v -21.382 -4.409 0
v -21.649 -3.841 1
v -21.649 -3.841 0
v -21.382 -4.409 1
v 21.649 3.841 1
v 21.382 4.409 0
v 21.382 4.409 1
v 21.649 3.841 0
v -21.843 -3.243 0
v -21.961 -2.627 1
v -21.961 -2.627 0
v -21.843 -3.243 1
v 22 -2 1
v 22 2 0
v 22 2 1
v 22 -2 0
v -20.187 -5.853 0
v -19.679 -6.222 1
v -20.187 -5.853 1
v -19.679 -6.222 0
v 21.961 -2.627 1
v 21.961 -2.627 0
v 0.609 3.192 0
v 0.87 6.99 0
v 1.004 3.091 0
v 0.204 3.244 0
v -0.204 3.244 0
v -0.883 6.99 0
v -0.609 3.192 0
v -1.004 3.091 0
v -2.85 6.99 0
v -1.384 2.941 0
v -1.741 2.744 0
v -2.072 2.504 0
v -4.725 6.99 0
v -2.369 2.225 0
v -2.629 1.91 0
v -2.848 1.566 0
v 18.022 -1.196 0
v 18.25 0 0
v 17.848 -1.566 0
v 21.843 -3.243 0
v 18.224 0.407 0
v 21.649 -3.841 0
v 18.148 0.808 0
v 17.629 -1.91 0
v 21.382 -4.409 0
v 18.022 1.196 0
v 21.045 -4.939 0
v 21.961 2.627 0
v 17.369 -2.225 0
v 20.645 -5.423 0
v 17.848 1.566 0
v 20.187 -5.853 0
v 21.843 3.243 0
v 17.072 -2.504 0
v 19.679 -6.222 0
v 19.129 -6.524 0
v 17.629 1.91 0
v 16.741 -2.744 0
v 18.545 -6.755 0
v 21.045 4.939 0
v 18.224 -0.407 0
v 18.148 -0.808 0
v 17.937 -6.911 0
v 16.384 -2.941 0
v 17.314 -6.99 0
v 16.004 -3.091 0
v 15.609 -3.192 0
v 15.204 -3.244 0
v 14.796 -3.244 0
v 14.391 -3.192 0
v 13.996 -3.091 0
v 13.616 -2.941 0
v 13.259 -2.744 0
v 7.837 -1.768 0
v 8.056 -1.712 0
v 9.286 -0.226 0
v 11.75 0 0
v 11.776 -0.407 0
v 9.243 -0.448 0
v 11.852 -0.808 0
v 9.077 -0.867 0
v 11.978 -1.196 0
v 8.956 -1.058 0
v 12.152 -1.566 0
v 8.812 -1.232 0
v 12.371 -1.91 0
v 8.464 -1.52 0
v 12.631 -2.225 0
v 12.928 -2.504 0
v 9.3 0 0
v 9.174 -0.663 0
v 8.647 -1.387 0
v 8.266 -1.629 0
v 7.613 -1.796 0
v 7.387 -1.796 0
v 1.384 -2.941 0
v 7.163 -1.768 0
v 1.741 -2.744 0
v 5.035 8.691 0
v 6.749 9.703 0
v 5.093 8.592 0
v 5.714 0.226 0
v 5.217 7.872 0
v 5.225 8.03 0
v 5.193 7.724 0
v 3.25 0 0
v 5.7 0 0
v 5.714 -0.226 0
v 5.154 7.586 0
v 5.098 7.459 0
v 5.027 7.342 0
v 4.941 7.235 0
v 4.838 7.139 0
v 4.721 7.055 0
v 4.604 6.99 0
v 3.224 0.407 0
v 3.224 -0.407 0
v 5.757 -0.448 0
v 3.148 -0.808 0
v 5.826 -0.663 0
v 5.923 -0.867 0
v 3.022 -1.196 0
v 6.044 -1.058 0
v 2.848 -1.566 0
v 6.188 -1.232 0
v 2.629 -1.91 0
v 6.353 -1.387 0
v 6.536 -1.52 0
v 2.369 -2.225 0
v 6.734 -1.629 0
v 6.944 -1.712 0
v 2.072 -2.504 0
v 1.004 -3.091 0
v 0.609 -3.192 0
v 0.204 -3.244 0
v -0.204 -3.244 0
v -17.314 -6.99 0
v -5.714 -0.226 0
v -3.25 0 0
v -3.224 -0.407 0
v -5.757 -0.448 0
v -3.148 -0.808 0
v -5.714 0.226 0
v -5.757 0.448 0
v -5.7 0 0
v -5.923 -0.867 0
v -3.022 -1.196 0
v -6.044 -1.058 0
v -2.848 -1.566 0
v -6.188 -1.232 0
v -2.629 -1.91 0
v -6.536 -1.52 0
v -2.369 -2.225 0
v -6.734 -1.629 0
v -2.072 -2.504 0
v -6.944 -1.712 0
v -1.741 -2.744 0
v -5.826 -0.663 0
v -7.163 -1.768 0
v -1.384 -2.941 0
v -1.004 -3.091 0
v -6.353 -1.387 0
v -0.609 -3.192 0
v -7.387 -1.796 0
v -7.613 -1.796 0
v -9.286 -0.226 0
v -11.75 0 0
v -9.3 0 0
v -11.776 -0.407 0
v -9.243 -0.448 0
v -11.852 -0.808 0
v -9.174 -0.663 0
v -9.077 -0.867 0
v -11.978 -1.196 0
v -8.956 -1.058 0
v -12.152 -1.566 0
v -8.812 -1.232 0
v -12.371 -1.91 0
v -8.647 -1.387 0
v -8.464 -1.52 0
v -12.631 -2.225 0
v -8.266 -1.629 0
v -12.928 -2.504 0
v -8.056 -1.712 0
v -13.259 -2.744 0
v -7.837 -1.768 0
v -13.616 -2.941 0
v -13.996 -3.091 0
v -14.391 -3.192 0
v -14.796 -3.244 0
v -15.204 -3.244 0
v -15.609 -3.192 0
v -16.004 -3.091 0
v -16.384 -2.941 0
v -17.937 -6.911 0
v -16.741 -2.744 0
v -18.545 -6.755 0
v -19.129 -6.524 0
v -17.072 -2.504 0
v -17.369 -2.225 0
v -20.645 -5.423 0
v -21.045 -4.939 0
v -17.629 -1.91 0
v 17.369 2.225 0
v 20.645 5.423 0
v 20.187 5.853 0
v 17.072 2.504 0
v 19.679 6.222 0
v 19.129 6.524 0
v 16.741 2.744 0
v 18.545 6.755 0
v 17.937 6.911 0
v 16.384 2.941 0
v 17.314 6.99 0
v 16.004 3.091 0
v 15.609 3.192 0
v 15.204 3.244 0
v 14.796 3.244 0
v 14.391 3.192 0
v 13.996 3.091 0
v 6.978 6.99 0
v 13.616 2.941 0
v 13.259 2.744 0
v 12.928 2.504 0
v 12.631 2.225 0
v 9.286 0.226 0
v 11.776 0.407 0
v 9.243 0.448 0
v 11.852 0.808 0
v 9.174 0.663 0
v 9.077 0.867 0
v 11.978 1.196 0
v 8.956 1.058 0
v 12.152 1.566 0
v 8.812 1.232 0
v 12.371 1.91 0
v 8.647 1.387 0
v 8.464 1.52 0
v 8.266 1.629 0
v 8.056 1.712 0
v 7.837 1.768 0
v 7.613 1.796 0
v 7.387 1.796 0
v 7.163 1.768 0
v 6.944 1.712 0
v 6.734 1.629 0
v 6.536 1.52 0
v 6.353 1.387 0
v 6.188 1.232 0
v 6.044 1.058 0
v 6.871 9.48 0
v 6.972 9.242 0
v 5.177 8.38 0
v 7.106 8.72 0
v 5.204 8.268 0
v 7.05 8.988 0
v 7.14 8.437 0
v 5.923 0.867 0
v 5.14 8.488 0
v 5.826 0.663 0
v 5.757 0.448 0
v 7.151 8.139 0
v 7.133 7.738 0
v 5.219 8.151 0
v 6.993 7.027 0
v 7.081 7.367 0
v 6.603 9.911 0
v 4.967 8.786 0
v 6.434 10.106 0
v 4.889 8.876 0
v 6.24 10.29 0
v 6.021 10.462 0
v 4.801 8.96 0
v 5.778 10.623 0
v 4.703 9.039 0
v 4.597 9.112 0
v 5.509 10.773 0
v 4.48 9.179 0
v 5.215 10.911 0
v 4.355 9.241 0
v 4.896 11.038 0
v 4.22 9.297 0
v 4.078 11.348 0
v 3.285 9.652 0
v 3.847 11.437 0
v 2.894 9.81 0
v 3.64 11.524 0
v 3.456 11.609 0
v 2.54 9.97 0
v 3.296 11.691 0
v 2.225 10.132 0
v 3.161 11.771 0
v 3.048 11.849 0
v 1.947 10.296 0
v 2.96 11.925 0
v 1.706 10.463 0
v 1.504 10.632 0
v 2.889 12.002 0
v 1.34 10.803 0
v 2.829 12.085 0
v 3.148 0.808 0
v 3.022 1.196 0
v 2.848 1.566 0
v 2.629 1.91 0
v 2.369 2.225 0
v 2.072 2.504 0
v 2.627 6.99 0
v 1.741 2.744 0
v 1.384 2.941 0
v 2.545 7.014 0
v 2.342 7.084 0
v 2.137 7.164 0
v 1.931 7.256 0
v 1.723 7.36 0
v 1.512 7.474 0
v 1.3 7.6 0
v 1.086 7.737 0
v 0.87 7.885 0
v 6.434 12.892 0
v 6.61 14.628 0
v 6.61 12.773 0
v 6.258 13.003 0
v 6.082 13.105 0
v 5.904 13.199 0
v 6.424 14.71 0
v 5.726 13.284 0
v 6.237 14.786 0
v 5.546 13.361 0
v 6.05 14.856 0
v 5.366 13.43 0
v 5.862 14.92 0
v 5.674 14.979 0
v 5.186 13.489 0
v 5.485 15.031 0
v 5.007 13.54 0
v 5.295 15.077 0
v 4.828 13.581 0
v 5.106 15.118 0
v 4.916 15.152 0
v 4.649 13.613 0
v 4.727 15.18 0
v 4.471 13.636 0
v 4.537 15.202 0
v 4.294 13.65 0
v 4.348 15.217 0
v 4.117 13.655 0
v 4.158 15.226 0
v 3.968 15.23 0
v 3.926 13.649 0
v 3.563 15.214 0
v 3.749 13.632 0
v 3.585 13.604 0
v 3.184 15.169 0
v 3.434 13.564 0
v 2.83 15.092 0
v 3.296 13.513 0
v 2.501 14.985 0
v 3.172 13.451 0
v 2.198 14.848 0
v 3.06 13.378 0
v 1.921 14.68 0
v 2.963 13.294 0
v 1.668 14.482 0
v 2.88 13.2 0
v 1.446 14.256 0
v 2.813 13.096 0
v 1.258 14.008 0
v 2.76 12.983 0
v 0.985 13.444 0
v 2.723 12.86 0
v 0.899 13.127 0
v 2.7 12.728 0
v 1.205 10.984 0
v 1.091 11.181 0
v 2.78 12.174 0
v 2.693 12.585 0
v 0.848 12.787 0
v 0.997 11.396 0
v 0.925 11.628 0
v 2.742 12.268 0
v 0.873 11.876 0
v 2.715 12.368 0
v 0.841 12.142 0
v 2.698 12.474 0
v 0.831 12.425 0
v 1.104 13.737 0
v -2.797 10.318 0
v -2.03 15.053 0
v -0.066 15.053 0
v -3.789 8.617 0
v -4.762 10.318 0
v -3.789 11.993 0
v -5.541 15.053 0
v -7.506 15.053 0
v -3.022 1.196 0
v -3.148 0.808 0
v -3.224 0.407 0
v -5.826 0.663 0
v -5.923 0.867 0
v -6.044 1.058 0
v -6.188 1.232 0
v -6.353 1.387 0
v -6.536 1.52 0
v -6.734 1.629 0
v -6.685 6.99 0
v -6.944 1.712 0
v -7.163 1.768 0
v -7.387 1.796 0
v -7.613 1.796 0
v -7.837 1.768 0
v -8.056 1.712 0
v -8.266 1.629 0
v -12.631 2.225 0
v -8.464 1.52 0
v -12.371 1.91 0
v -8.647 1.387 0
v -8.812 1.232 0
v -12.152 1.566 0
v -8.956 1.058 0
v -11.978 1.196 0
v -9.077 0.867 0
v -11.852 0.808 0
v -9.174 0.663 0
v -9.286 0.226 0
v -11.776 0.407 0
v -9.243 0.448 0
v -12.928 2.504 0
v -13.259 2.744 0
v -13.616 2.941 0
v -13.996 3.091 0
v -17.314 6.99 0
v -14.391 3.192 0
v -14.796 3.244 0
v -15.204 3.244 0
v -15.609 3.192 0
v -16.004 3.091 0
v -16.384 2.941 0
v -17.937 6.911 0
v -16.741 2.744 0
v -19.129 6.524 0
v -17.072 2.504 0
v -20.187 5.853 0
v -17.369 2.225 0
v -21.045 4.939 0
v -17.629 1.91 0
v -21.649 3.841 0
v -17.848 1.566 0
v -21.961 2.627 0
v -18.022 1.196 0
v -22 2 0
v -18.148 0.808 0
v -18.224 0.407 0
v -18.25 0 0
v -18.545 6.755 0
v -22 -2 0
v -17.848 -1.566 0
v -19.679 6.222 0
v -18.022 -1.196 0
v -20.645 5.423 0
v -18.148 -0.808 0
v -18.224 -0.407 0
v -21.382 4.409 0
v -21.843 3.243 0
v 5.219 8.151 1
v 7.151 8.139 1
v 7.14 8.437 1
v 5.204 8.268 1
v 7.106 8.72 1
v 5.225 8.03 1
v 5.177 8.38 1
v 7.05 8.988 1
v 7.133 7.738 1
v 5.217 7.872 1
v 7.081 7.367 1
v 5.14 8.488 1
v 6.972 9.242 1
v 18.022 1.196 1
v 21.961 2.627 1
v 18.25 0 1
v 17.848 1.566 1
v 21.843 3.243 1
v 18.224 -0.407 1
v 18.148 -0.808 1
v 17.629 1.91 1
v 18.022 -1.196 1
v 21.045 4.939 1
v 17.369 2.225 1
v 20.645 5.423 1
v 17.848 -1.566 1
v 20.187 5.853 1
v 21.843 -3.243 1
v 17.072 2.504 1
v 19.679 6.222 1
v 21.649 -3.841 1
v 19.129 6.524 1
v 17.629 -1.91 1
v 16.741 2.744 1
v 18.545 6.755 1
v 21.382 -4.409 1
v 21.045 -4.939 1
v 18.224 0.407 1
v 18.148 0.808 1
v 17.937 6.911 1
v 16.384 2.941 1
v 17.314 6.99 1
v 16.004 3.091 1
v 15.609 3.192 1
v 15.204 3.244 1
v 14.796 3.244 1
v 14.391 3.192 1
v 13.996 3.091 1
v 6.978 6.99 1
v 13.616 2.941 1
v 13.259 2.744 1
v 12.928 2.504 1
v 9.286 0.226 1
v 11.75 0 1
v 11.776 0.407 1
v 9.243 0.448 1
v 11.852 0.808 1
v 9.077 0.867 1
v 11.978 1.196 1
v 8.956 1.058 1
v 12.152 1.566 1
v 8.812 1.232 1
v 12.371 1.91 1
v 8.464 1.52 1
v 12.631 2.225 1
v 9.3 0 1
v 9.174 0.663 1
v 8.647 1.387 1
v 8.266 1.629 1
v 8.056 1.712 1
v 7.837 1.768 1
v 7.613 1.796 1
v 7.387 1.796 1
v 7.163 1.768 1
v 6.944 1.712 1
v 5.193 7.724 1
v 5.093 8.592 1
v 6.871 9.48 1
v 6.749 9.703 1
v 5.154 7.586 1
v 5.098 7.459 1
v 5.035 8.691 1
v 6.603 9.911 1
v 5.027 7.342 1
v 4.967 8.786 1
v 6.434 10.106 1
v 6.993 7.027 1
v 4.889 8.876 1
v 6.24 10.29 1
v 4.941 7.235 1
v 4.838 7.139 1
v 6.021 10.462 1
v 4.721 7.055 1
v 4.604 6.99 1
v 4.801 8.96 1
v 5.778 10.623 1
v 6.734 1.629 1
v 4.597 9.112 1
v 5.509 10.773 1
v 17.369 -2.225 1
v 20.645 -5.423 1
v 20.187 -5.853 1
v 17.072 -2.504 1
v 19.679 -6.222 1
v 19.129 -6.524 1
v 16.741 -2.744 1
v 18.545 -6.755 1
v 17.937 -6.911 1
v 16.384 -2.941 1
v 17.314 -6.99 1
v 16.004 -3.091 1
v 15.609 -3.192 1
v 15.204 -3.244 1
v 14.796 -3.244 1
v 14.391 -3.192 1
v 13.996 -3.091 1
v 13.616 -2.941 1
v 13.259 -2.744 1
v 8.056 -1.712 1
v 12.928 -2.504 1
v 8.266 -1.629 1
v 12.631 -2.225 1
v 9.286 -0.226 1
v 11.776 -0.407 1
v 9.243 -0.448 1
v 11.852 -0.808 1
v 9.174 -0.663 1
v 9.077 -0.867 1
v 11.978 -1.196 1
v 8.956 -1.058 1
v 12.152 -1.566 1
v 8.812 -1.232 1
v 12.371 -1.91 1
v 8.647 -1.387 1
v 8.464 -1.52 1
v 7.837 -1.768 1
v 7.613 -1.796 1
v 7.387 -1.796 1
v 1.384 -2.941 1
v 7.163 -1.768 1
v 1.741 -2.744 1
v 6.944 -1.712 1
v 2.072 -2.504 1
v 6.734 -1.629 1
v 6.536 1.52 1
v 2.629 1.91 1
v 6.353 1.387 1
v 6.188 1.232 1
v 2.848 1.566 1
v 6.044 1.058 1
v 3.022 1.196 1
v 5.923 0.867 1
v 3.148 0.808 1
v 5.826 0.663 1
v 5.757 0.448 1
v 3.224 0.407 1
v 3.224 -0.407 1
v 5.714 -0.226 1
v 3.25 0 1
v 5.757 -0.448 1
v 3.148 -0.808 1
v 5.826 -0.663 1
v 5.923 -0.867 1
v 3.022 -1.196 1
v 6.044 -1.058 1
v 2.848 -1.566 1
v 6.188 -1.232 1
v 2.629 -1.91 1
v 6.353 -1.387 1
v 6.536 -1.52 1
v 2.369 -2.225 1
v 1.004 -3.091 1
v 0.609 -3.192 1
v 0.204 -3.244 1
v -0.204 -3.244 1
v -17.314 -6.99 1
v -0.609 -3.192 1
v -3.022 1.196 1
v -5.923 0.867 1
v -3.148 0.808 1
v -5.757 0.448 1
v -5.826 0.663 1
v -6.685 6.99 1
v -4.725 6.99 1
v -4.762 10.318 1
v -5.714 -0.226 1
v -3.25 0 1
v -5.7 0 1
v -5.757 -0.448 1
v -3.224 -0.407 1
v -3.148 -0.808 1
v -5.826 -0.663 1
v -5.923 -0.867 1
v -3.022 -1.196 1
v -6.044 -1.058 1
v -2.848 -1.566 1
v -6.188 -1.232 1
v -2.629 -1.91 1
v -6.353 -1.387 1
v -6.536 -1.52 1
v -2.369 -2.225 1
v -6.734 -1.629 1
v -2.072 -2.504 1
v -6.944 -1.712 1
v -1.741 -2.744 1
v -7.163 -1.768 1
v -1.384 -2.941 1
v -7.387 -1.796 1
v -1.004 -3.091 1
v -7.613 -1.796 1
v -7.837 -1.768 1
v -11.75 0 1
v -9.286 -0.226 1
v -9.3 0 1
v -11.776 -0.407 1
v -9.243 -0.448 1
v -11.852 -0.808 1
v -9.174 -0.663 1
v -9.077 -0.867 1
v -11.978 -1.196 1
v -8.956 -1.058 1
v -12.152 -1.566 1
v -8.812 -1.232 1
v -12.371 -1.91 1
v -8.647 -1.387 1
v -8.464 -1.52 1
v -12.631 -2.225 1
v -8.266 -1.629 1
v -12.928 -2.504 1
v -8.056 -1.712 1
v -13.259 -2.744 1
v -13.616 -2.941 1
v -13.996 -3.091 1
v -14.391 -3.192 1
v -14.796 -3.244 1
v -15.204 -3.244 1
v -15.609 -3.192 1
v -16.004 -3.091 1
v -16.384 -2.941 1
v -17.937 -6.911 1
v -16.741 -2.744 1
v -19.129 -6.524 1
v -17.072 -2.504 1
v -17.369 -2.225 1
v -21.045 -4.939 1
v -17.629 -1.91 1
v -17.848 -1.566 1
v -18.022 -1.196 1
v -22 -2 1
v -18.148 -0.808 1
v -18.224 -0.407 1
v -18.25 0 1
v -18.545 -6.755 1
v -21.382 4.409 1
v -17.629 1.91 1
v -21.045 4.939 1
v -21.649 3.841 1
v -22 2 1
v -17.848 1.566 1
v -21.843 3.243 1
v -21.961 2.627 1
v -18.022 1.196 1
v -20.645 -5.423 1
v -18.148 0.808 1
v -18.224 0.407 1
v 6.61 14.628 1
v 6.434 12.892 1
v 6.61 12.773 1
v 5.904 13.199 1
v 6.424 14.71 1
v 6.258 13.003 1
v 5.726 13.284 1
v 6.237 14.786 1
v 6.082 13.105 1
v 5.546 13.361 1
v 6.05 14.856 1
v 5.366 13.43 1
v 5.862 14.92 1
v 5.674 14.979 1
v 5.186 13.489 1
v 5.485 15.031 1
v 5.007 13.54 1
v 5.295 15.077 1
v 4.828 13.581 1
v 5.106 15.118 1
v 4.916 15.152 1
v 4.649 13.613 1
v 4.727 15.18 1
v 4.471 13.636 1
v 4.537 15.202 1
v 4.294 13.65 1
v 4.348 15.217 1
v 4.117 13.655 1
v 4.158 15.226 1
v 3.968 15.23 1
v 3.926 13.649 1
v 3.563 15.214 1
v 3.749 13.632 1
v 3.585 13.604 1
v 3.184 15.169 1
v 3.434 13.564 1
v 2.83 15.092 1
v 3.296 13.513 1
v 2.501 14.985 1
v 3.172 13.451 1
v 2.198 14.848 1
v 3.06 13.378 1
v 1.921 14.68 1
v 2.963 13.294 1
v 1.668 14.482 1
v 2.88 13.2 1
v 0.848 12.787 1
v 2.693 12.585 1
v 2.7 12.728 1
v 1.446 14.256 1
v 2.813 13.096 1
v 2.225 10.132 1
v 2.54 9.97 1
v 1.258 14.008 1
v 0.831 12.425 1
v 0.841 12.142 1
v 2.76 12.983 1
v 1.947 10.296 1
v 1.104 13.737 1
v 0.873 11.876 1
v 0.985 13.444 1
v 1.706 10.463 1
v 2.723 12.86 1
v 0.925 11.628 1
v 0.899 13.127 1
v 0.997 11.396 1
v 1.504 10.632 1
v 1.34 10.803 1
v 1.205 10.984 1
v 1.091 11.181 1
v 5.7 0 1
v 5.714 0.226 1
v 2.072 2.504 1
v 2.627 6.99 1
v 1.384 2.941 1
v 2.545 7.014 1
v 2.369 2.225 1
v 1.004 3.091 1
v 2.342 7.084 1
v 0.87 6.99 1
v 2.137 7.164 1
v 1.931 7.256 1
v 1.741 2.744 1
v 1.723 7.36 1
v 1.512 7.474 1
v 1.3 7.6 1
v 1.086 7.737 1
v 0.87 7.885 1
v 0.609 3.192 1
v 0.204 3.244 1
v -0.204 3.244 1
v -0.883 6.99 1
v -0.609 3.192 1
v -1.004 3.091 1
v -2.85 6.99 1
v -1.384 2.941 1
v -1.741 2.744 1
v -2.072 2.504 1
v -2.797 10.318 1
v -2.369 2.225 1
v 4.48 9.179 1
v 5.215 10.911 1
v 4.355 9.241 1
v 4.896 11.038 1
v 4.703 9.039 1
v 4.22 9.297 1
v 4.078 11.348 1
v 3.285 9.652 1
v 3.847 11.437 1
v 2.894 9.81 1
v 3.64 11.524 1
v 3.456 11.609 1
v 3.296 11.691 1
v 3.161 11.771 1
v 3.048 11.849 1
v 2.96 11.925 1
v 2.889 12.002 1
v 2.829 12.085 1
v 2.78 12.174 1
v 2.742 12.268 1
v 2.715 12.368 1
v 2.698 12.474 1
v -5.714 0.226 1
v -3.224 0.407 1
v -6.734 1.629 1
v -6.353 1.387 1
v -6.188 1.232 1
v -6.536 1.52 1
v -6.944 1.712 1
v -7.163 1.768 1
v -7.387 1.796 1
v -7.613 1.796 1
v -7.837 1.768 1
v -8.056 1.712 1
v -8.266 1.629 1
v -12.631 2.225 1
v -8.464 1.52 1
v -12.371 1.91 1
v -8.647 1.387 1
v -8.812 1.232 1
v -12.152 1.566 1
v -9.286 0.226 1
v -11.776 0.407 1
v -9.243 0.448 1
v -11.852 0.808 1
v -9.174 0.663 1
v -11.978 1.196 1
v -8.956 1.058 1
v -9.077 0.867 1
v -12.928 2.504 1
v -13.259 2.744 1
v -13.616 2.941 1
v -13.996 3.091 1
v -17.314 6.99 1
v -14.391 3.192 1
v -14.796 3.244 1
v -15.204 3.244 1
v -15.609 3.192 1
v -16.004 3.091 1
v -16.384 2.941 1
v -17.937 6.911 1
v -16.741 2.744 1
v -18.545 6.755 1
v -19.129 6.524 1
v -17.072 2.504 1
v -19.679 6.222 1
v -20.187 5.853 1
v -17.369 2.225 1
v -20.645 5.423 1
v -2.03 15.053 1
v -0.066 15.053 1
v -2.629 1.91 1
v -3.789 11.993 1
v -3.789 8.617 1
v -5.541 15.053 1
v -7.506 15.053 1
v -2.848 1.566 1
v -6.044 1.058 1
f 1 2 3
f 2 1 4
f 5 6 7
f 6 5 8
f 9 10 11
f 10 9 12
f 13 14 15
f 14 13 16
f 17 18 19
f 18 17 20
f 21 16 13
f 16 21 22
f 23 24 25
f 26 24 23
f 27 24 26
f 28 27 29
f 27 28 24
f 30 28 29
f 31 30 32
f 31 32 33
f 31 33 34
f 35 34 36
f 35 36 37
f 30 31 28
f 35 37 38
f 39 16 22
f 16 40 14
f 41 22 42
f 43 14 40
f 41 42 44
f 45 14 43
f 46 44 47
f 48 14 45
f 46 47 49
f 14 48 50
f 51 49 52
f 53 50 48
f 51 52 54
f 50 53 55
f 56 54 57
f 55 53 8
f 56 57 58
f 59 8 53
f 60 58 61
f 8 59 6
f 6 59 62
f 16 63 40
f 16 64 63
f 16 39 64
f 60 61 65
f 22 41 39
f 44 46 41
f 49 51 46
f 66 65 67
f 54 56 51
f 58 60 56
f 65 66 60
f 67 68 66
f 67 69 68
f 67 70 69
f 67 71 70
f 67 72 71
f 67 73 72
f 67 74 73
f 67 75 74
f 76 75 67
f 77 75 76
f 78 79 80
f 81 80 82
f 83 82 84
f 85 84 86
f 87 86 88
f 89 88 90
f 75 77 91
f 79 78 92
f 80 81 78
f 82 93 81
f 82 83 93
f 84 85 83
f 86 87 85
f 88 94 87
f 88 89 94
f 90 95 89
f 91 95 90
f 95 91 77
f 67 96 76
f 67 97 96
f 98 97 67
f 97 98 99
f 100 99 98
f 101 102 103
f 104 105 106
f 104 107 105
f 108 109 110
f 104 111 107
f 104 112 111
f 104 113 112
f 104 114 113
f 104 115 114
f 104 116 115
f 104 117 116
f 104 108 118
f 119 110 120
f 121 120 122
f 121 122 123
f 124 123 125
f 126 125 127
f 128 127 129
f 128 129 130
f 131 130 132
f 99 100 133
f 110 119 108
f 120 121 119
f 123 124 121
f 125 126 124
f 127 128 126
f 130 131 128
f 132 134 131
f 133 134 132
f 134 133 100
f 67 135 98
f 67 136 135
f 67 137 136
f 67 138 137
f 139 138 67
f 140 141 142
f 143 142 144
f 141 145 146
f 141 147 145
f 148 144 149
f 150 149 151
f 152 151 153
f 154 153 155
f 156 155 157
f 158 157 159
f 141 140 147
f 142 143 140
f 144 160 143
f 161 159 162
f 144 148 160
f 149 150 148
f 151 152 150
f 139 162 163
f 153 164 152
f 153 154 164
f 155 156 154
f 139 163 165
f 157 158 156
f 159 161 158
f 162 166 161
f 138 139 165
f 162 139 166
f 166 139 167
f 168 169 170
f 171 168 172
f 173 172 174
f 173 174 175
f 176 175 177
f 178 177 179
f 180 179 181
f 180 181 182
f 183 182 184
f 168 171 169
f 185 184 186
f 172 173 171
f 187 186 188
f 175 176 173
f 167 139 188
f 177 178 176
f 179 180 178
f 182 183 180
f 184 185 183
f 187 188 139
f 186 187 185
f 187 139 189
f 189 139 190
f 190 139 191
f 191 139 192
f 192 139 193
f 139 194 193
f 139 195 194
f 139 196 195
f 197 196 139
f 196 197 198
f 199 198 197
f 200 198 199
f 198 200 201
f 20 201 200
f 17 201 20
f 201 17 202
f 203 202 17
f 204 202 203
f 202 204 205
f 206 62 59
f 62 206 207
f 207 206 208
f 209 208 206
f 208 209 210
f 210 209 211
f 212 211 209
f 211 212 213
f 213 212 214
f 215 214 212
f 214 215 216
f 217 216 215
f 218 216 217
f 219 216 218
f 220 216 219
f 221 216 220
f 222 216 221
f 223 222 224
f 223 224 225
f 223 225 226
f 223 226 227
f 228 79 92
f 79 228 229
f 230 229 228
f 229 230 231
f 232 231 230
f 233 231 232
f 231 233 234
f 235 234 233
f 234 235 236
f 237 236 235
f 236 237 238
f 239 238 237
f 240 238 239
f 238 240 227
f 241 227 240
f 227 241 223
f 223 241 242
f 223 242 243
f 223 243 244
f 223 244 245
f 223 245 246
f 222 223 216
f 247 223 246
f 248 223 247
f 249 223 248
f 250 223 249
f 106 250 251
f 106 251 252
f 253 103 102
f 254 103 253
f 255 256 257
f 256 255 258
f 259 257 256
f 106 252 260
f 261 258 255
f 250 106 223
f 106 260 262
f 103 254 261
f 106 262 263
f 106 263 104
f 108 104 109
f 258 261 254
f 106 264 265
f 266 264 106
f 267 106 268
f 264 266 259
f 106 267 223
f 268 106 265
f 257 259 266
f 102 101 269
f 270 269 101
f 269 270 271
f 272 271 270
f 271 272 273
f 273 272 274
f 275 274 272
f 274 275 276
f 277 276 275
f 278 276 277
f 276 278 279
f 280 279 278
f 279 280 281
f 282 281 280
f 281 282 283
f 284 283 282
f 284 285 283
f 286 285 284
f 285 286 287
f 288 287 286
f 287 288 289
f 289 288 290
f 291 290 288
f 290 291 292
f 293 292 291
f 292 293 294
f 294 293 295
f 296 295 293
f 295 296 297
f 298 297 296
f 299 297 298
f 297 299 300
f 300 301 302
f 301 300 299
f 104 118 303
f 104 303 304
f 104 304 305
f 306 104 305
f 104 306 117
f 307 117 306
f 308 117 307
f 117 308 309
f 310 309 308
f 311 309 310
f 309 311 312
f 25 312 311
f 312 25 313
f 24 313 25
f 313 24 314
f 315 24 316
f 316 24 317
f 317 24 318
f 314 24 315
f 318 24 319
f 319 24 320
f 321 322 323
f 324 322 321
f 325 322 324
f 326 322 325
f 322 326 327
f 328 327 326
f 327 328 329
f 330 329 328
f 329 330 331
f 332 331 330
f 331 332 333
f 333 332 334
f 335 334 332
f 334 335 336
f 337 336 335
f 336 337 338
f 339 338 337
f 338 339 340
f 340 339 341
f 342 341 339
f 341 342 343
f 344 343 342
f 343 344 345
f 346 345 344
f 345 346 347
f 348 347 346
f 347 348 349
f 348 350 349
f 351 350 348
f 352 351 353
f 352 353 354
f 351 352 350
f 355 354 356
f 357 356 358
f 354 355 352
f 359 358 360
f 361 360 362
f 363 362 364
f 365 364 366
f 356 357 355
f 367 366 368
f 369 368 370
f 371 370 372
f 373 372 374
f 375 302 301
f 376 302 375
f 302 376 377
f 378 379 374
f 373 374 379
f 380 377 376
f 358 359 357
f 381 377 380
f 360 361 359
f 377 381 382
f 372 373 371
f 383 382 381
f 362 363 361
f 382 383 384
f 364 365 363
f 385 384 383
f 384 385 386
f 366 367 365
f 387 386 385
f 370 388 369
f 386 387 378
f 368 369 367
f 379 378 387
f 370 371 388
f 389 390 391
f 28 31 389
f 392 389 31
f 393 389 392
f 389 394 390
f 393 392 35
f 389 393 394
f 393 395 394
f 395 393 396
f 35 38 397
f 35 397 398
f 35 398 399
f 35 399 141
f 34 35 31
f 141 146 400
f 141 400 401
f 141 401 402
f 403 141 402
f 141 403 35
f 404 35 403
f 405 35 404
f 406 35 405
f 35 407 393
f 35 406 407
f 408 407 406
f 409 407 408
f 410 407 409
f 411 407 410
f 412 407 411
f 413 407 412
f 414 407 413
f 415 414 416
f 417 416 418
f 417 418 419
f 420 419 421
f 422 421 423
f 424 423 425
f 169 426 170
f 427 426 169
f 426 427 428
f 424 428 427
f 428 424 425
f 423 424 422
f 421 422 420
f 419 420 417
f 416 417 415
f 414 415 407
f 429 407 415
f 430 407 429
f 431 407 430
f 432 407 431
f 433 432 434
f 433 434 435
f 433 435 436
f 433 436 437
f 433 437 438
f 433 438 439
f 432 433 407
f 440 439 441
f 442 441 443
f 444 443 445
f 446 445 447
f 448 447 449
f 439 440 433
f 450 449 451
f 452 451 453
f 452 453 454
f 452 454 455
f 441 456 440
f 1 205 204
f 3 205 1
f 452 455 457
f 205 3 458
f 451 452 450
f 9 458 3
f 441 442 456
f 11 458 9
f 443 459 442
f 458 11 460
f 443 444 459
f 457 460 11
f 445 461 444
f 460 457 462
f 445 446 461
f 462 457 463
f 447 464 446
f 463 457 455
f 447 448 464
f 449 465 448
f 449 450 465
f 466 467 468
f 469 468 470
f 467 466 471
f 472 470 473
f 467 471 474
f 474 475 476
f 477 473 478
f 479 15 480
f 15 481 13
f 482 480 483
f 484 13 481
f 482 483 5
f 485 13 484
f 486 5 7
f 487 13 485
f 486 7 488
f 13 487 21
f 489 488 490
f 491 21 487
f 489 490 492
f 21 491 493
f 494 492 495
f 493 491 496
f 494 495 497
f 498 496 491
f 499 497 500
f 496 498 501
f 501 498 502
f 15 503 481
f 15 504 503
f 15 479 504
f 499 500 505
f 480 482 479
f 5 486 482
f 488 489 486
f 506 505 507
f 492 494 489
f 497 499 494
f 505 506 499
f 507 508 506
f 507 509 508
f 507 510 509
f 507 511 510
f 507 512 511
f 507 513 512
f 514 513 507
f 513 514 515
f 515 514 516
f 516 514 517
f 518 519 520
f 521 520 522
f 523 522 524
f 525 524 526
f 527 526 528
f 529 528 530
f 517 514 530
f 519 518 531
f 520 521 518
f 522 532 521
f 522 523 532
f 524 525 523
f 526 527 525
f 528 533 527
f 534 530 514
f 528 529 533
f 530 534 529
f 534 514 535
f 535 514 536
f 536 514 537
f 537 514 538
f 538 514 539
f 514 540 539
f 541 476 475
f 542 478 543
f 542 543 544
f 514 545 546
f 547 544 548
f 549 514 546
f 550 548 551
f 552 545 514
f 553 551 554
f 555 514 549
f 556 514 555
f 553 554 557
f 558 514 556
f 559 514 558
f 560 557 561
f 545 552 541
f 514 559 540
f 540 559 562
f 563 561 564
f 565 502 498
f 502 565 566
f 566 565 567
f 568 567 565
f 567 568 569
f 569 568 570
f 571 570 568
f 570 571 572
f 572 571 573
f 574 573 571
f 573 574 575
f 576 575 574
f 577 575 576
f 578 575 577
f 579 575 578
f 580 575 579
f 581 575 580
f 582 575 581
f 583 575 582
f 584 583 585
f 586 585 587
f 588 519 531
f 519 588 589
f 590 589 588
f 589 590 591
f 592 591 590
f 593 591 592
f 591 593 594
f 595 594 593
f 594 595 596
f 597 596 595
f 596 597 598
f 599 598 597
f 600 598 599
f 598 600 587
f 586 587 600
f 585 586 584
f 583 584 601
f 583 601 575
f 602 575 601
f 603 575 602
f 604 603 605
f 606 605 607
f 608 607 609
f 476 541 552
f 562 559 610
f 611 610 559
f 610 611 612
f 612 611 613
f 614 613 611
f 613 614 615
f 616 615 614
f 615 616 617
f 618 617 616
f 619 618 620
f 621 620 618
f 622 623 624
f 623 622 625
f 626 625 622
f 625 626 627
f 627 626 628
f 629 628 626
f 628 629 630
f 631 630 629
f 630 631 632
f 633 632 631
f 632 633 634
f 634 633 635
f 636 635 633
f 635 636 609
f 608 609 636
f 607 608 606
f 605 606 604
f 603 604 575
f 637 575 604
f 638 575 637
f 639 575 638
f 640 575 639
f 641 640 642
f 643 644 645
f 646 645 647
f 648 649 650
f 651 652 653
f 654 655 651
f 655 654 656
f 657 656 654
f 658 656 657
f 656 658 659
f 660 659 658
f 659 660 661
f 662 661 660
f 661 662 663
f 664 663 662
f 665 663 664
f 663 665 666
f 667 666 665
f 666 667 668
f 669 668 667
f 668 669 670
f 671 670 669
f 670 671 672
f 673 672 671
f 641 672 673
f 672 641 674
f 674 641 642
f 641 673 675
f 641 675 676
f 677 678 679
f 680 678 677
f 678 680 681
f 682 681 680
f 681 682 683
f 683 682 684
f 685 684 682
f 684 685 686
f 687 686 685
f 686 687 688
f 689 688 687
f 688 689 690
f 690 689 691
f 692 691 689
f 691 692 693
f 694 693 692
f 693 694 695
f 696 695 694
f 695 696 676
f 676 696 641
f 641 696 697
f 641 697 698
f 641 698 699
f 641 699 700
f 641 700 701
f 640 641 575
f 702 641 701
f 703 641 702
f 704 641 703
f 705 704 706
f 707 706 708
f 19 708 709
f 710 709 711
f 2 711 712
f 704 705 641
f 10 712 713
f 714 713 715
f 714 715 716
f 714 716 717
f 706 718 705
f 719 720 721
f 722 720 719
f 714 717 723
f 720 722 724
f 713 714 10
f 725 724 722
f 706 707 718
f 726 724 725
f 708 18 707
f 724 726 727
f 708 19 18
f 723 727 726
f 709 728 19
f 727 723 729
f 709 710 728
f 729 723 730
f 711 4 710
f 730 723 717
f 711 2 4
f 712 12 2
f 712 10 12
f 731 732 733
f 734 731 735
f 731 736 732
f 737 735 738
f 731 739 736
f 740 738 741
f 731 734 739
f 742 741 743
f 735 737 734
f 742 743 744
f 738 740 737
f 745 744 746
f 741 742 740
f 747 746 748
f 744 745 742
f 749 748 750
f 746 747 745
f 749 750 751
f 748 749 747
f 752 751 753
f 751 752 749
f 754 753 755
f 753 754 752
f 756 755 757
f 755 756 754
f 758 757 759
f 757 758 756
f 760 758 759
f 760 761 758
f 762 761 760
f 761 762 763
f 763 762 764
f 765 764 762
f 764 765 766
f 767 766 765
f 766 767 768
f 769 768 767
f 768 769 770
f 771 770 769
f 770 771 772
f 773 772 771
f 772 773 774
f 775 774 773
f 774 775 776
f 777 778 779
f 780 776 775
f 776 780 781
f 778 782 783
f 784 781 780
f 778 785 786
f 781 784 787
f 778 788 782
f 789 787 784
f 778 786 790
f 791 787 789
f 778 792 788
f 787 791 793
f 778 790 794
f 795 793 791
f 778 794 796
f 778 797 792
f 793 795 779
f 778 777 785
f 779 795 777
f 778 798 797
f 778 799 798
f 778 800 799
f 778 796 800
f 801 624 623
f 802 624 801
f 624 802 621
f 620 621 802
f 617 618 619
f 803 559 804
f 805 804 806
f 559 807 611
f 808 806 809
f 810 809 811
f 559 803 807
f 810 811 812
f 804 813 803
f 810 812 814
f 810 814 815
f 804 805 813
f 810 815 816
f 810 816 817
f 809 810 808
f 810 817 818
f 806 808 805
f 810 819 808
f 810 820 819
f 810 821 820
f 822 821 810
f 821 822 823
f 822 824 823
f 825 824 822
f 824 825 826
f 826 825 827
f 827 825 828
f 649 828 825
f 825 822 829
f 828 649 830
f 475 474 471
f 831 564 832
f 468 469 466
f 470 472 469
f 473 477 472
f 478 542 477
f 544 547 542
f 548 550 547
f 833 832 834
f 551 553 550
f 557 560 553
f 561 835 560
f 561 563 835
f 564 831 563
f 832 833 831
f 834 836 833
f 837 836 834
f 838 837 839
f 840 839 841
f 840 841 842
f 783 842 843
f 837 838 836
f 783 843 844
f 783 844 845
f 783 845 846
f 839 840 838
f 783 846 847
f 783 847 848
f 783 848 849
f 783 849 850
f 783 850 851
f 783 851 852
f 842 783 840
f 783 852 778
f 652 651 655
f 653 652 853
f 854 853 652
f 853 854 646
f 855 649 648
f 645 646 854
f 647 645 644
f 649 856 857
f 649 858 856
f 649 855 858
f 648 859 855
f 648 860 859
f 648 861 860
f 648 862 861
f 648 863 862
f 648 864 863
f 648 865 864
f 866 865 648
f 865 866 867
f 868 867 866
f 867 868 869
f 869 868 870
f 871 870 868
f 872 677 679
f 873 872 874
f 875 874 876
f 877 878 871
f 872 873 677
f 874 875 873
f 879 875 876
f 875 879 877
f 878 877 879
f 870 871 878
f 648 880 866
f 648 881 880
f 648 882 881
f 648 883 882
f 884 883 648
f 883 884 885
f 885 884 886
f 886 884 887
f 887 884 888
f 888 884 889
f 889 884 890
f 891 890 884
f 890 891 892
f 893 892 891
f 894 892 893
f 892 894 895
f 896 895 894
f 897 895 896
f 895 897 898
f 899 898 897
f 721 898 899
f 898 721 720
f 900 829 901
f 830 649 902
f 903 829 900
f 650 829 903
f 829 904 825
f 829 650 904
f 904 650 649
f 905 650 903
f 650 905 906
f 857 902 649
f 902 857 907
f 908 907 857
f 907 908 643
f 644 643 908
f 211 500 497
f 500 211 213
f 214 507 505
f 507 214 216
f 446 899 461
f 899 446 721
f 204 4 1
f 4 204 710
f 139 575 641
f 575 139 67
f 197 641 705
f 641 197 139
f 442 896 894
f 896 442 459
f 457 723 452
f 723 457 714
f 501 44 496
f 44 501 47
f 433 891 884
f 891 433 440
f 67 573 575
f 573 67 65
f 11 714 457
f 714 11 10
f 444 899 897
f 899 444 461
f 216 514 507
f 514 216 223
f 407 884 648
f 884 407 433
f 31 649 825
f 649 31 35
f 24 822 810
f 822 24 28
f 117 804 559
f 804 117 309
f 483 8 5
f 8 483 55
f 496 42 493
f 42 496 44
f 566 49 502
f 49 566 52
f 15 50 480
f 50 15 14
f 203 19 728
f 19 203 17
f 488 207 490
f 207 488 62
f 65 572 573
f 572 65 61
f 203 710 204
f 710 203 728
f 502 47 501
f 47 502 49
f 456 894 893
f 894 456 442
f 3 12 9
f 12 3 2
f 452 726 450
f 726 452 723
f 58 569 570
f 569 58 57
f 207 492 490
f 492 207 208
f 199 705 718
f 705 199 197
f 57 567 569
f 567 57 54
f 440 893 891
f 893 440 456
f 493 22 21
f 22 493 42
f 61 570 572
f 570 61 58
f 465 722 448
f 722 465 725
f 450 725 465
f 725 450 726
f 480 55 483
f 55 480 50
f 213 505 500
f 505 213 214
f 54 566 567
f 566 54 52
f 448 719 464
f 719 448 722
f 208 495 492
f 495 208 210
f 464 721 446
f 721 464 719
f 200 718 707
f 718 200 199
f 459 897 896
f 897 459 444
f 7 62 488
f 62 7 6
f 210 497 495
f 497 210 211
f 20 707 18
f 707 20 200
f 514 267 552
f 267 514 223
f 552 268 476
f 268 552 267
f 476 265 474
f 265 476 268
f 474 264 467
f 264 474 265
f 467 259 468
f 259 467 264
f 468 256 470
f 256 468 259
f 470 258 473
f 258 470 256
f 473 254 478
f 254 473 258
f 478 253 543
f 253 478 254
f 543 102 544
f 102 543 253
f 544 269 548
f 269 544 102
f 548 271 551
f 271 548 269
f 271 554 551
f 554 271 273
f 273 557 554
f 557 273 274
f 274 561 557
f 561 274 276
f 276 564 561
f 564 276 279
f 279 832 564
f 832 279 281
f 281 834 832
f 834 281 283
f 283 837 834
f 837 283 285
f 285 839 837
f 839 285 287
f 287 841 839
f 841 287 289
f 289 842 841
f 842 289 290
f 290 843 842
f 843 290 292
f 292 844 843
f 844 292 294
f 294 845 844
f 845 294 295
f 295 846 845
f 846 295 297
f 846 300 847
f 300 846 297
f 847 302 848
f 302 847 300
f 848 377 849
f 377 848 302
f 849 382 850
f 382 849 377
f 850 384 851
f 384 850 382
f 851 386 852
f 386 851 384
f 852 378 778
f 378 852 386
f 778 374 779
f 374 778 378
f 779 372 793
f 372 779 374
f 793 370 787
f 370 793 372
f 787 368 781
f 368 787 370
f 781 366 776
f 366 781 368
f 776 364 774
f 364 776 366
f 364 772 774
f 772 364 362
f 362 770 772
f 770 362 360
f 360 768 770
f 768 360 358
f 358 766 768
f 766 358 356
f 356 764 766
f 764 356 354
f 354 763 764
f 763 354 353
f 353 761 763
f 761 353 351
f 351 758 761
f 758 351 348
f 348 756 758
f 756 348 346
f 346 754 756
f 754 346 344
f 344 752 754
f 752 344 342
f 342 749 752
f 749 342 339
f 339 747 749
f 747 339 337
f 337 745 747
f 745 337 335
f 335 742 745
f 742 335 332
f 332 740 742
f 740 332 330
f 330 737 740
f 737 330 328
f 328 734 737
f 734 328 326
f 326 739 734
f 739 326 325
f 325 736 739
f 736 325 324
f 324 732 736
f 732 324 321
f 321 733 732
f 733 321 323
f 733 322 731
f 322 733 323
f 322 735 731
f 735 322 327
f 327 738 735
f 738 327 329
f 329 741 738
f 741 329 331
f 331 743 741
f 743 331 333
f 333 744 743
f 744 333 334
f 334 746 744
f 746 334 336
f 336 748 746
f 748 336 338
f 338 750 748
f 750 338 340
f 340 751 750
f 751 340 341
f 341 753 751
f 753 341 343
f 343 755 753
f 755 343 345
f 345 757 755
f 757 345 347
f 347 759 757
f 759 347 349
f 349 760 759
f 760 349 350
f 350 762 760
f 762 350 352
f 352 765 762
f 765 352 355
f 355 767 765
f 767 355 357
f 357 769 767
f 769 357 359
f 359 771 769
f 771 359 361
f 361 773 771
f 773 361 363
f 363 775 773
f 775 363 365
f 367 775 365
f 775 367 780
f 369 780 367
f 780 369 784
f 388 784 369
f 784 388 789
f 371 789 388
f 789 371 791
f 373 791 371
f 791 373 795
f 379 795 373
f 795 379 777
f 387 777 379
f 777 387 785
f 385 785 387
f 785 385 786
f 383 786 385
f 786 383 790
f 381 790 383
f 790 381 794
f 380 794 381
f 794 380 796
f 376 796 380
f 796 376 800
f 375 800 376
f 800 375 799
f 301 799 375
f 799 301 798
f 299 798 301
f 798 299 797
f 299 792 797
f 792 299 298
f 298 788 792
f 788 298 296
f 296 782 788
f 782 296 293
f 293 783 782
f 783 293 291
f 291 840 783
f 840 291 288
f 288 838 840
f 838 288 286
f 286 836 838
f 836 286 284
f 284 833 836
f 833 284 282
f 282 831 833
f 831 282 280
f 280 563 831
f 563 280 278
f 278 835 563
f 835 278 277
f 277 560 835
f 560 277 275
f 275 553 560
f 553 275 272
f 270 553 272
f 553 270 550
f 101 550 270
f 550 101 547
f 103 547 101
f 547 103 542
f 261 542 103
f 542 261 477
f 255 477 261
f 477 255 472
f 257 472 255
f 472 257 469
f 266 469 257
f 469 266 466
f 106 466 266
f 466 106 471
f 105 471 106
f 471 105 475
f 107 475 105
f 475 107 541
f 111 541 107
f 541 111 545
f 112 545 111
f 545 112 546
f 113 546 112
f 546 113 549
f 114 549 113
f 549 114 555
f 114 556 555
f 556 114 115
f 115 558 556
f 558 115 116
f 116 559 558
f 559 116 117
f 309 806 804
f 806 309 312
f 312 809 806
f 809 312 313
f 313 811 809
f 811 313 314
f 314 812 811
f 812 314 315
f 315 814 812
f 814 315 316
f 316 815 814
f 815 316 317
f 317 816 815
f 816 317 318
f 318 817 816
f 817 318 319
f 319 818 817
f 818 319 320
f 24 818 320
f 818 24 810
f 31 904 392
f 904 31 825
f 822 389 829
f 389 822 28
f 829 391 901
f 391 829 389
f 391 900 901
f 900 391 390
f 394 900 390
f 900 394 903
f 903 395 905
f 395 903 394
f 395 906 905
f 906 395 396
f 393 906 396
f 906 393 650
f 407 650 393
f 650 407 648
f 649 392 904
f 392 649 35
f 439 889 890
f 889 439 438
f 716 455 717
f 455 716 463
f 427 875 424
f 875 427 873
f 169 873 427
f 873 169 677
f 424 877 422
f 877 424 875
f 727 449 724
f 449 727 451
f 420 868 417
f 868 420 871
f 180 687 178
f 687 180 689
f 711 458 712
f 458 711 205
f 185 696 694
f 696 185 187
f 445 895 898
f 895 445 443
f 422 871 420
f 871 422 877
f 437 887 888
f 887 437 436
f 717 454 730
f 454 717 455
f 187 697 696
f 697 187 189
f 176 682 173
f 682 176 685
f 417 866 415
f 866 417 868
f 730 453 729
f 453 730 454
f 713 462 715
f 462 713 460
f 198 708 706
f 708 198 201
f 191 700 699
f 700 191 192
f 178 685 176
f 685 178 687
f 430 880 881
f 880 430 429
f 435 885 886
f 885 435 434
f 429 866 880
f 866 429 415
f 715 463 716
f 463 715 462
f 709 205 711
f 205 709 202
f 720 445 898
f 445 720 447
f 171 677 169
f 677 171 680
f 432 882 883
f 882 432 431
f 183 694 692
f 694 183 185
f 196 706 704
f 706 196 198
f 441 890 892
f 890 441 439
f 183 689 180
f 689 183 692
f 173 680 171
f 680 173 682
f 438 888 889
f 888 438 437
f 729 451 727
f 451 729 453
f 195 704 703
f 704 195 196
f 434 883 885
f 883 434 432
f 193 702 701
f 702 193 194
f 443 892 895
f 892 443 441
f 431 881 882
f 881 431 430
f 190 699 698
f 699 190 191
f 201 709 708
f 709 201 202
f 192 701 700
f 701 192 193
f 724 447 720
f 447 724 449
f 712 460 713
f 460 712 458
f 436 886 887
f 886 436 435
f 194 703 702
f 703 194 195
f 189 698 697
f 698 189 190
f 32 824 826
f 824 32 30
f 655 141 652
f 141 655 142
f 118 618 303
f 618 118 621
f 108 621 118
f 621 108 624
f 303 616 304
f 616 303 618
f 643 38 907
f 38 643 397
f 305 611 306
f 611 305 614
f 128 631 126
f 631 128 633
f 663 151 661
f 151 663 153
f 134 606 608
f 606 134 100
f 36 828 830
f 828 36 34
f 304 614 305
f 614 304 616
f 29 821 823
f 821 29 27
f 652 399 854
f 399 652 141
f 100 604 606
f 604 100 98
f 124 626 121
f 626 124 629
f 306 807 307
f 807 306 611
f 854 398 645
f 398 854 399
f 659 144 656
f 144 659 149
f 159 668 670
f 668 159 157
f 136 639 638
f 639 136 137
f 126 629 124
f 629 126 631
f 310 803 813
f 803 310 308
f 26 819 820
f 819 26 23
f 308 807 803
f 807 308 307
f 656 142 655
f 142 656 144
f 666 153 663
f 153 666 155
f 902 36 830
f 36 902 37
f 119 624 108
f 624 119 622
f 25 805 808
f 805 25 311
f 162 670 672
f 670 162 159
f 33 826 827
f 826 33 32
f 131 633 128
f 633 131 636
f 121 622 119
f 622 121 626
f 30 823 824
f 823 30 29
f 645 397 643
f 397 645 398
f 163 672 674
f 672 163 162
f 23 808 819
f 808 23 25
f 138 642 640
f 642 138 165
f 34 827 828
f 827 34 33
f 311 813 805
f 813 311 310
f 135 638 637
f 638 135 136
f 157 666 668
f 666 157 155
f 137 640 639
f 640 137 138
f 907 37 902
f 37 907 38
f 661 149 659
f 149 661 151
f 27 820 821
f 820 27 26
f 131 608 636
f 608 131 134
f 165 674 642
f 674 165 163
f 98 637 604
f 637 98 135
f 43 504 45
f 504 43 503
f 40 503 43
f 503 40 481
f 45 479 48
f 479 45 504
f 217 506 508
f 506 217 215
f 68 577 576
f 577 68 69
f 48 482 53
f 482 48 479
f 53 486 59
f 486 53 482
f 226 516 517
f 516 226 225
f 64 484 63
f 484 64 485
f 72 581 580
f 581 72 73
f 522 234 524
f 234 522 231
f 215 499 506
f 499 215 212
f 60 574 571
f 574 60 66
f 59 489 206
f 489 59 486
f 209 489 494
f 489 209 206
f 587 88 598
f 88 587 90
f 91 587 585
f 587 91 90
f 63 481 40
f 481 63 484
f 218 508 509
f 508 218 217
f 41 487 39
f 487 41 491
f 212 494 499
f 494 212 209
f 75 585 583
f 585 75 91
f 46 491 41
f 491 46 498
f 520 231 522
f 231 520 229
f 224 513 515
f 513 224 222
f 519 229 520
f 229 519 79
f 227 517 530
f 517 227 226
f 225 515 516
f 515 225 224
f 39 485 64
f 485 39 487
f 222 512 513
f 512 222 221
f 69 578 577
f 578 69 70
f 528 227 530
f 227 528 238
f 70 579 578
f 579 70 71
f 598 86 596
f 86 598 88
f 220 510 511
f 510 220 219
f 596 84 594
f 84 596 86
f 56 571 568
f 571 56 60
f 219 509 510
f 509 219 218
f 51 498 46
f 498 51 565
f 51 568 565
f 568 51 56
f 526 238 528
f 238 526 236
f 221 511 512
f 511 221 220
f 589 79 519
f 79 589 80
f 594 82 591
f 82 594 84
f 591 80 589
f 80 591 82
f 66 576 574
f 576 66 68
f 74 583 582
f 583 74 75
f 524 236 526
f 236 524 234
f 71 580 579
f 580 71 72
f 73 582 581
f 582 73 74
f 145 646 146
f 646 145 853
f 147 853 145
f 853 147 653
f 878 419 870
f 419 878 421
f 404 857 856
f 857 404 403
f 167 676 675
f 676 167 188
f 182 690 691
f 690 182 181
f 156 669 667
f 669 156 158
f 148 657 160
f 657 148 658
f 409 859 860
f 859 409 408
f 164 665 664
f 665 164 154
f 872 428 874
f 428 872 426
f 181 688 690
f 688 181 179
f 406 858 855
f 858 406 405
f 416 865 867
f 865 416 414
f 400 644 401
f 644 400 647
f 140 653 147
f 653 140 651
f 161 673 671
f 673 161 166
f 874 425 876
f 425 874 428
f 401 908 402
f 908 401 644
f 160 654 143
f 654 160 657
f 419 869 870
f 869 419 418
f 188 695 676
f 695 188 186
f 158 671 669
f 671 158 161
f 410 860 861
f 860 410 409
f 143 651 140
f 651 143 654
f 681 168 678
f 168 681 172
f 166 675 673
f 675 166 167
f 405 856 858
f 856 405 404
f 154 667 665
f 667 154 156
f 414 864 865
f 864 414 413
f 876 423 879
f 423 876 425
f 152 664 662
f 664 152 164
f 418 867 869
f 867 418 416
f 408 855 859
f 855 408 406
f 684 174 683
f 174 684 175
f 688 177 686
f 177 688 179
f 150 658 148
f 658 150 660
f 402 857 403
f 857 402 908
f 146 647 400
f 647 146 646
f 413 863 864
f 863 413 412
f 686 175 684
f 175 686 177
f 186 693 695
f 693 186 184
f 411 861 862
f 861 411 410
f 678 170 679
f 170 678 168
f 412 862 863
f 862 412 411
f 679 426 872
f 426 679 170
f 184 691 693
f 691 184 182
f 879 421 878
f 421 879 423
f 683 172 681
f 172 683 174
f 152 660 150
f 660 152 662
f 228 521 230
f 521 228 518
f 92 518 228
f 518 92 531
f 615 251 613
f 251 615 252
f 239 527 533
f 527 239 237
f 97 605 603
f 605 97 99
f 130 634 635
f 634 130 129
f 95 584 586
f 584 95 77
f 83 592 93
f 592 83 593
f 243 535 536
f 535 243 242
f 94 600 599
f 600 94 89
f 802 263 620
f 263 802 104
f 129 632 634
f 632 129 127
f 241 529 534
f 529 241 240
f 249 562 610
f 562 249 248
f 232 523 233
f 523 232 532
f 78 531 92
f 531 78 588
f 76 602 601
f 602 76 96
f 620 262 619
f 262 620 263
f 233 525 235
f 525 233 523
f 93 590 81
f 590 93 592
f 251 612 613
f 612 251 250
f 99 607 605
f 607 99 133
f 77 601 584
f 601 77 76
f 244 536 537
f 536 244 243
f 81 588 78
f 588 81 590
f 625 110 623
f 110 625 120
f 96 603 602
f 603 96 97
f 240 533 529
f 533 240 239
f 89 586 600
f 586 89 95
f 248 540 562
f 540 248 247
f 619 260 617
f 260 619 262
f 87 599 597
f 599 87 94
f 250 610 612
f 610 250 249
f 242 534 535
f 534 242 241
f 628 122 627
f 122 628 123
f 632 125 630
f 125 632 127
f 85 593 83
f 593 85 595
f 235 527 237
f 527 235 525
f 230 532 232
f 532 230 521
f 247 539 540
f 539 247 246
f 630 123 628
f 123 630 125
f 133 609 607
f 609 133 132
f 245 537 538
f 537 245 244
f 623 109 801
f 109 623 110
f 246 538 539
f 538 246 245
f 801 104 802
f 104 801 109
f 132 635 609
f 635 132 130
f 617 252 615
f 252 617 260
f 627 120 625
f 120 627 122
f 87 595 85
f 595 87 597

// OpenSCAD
$fn = 50;


difference() {
	union() {
		hull() {
			translate(v = [-17.0000000000, 2.0000000000, 0]) {
				cylinder(h = 1, r = 5);
			}
			translate(v = [17.0000000000, 2.0000000000, 0]) {
				cylinder(h = 1, r = 5);
			}
			translate(v = [-17.0000000000, -2.0000000000, 0]) {
				cylinder(h = 1, r = 5);
			}
			translate(v = [17.0000000000, -2.0000000000, 0]) {
				cylinder(h = 1, r = 5);
			}
		}
		translate(v = [0, 15.0000000000, 0]) {
			linear_extrude(height = 1) {
				text(font = "DejaVu Sans Mono:style=Bold", halign = "center", size = 9.5000000000, text = "XS", valign = "top");
			}
		}
	}
	union() {
		translate(v = [-15.0000000000, 0.0000000000, 0]) {
			translate(v = [0, 0, -100]) {
				cylinder(h = 200, r = 3.2500000000);
			}
		}
		translate(v = [0, 0, -100]) {
			cylinder(h = 200, r = 3.2500000000);
		}
		translate(v = [15.0000000000, 0.0000000000, 0]) {
			translate(v = [0, 0, -100]) {
				cylinder(h = 200, r = 3.2500000000);
			}
		}
		translate(v = [-15.0000000000, 0.0000000000, 0]) {
			translate(v = [0, 0, -100]) {
				cylinder(h = 200, r = 1.8000000000);
			}
		}
		translate(v = [-7.5000000000, 0.0000000000, 0]) {
			translate(v = [0, 0, -100]) {
				cylinder(h = 200, r = 1.8000000000);
			}
		}
		translate(v = [0, 0, -100]) {
			cylinder(h = 200, r = 1.8000000000);
		}
		translate(v = [7.5000000000, 0.0000000000, 0]) {
			translate(v = [0, 0, -100]) {
				cylinder(h = 200, r = 1.8000000000);
			}
		}
		translate(v = [15.0000000000, 0.0000000000, 0]) {
			translate(v = [0, 0, -100]) {
				cylinder(h = 200, r = 1.8000000000);
			}
		}
	}
}
